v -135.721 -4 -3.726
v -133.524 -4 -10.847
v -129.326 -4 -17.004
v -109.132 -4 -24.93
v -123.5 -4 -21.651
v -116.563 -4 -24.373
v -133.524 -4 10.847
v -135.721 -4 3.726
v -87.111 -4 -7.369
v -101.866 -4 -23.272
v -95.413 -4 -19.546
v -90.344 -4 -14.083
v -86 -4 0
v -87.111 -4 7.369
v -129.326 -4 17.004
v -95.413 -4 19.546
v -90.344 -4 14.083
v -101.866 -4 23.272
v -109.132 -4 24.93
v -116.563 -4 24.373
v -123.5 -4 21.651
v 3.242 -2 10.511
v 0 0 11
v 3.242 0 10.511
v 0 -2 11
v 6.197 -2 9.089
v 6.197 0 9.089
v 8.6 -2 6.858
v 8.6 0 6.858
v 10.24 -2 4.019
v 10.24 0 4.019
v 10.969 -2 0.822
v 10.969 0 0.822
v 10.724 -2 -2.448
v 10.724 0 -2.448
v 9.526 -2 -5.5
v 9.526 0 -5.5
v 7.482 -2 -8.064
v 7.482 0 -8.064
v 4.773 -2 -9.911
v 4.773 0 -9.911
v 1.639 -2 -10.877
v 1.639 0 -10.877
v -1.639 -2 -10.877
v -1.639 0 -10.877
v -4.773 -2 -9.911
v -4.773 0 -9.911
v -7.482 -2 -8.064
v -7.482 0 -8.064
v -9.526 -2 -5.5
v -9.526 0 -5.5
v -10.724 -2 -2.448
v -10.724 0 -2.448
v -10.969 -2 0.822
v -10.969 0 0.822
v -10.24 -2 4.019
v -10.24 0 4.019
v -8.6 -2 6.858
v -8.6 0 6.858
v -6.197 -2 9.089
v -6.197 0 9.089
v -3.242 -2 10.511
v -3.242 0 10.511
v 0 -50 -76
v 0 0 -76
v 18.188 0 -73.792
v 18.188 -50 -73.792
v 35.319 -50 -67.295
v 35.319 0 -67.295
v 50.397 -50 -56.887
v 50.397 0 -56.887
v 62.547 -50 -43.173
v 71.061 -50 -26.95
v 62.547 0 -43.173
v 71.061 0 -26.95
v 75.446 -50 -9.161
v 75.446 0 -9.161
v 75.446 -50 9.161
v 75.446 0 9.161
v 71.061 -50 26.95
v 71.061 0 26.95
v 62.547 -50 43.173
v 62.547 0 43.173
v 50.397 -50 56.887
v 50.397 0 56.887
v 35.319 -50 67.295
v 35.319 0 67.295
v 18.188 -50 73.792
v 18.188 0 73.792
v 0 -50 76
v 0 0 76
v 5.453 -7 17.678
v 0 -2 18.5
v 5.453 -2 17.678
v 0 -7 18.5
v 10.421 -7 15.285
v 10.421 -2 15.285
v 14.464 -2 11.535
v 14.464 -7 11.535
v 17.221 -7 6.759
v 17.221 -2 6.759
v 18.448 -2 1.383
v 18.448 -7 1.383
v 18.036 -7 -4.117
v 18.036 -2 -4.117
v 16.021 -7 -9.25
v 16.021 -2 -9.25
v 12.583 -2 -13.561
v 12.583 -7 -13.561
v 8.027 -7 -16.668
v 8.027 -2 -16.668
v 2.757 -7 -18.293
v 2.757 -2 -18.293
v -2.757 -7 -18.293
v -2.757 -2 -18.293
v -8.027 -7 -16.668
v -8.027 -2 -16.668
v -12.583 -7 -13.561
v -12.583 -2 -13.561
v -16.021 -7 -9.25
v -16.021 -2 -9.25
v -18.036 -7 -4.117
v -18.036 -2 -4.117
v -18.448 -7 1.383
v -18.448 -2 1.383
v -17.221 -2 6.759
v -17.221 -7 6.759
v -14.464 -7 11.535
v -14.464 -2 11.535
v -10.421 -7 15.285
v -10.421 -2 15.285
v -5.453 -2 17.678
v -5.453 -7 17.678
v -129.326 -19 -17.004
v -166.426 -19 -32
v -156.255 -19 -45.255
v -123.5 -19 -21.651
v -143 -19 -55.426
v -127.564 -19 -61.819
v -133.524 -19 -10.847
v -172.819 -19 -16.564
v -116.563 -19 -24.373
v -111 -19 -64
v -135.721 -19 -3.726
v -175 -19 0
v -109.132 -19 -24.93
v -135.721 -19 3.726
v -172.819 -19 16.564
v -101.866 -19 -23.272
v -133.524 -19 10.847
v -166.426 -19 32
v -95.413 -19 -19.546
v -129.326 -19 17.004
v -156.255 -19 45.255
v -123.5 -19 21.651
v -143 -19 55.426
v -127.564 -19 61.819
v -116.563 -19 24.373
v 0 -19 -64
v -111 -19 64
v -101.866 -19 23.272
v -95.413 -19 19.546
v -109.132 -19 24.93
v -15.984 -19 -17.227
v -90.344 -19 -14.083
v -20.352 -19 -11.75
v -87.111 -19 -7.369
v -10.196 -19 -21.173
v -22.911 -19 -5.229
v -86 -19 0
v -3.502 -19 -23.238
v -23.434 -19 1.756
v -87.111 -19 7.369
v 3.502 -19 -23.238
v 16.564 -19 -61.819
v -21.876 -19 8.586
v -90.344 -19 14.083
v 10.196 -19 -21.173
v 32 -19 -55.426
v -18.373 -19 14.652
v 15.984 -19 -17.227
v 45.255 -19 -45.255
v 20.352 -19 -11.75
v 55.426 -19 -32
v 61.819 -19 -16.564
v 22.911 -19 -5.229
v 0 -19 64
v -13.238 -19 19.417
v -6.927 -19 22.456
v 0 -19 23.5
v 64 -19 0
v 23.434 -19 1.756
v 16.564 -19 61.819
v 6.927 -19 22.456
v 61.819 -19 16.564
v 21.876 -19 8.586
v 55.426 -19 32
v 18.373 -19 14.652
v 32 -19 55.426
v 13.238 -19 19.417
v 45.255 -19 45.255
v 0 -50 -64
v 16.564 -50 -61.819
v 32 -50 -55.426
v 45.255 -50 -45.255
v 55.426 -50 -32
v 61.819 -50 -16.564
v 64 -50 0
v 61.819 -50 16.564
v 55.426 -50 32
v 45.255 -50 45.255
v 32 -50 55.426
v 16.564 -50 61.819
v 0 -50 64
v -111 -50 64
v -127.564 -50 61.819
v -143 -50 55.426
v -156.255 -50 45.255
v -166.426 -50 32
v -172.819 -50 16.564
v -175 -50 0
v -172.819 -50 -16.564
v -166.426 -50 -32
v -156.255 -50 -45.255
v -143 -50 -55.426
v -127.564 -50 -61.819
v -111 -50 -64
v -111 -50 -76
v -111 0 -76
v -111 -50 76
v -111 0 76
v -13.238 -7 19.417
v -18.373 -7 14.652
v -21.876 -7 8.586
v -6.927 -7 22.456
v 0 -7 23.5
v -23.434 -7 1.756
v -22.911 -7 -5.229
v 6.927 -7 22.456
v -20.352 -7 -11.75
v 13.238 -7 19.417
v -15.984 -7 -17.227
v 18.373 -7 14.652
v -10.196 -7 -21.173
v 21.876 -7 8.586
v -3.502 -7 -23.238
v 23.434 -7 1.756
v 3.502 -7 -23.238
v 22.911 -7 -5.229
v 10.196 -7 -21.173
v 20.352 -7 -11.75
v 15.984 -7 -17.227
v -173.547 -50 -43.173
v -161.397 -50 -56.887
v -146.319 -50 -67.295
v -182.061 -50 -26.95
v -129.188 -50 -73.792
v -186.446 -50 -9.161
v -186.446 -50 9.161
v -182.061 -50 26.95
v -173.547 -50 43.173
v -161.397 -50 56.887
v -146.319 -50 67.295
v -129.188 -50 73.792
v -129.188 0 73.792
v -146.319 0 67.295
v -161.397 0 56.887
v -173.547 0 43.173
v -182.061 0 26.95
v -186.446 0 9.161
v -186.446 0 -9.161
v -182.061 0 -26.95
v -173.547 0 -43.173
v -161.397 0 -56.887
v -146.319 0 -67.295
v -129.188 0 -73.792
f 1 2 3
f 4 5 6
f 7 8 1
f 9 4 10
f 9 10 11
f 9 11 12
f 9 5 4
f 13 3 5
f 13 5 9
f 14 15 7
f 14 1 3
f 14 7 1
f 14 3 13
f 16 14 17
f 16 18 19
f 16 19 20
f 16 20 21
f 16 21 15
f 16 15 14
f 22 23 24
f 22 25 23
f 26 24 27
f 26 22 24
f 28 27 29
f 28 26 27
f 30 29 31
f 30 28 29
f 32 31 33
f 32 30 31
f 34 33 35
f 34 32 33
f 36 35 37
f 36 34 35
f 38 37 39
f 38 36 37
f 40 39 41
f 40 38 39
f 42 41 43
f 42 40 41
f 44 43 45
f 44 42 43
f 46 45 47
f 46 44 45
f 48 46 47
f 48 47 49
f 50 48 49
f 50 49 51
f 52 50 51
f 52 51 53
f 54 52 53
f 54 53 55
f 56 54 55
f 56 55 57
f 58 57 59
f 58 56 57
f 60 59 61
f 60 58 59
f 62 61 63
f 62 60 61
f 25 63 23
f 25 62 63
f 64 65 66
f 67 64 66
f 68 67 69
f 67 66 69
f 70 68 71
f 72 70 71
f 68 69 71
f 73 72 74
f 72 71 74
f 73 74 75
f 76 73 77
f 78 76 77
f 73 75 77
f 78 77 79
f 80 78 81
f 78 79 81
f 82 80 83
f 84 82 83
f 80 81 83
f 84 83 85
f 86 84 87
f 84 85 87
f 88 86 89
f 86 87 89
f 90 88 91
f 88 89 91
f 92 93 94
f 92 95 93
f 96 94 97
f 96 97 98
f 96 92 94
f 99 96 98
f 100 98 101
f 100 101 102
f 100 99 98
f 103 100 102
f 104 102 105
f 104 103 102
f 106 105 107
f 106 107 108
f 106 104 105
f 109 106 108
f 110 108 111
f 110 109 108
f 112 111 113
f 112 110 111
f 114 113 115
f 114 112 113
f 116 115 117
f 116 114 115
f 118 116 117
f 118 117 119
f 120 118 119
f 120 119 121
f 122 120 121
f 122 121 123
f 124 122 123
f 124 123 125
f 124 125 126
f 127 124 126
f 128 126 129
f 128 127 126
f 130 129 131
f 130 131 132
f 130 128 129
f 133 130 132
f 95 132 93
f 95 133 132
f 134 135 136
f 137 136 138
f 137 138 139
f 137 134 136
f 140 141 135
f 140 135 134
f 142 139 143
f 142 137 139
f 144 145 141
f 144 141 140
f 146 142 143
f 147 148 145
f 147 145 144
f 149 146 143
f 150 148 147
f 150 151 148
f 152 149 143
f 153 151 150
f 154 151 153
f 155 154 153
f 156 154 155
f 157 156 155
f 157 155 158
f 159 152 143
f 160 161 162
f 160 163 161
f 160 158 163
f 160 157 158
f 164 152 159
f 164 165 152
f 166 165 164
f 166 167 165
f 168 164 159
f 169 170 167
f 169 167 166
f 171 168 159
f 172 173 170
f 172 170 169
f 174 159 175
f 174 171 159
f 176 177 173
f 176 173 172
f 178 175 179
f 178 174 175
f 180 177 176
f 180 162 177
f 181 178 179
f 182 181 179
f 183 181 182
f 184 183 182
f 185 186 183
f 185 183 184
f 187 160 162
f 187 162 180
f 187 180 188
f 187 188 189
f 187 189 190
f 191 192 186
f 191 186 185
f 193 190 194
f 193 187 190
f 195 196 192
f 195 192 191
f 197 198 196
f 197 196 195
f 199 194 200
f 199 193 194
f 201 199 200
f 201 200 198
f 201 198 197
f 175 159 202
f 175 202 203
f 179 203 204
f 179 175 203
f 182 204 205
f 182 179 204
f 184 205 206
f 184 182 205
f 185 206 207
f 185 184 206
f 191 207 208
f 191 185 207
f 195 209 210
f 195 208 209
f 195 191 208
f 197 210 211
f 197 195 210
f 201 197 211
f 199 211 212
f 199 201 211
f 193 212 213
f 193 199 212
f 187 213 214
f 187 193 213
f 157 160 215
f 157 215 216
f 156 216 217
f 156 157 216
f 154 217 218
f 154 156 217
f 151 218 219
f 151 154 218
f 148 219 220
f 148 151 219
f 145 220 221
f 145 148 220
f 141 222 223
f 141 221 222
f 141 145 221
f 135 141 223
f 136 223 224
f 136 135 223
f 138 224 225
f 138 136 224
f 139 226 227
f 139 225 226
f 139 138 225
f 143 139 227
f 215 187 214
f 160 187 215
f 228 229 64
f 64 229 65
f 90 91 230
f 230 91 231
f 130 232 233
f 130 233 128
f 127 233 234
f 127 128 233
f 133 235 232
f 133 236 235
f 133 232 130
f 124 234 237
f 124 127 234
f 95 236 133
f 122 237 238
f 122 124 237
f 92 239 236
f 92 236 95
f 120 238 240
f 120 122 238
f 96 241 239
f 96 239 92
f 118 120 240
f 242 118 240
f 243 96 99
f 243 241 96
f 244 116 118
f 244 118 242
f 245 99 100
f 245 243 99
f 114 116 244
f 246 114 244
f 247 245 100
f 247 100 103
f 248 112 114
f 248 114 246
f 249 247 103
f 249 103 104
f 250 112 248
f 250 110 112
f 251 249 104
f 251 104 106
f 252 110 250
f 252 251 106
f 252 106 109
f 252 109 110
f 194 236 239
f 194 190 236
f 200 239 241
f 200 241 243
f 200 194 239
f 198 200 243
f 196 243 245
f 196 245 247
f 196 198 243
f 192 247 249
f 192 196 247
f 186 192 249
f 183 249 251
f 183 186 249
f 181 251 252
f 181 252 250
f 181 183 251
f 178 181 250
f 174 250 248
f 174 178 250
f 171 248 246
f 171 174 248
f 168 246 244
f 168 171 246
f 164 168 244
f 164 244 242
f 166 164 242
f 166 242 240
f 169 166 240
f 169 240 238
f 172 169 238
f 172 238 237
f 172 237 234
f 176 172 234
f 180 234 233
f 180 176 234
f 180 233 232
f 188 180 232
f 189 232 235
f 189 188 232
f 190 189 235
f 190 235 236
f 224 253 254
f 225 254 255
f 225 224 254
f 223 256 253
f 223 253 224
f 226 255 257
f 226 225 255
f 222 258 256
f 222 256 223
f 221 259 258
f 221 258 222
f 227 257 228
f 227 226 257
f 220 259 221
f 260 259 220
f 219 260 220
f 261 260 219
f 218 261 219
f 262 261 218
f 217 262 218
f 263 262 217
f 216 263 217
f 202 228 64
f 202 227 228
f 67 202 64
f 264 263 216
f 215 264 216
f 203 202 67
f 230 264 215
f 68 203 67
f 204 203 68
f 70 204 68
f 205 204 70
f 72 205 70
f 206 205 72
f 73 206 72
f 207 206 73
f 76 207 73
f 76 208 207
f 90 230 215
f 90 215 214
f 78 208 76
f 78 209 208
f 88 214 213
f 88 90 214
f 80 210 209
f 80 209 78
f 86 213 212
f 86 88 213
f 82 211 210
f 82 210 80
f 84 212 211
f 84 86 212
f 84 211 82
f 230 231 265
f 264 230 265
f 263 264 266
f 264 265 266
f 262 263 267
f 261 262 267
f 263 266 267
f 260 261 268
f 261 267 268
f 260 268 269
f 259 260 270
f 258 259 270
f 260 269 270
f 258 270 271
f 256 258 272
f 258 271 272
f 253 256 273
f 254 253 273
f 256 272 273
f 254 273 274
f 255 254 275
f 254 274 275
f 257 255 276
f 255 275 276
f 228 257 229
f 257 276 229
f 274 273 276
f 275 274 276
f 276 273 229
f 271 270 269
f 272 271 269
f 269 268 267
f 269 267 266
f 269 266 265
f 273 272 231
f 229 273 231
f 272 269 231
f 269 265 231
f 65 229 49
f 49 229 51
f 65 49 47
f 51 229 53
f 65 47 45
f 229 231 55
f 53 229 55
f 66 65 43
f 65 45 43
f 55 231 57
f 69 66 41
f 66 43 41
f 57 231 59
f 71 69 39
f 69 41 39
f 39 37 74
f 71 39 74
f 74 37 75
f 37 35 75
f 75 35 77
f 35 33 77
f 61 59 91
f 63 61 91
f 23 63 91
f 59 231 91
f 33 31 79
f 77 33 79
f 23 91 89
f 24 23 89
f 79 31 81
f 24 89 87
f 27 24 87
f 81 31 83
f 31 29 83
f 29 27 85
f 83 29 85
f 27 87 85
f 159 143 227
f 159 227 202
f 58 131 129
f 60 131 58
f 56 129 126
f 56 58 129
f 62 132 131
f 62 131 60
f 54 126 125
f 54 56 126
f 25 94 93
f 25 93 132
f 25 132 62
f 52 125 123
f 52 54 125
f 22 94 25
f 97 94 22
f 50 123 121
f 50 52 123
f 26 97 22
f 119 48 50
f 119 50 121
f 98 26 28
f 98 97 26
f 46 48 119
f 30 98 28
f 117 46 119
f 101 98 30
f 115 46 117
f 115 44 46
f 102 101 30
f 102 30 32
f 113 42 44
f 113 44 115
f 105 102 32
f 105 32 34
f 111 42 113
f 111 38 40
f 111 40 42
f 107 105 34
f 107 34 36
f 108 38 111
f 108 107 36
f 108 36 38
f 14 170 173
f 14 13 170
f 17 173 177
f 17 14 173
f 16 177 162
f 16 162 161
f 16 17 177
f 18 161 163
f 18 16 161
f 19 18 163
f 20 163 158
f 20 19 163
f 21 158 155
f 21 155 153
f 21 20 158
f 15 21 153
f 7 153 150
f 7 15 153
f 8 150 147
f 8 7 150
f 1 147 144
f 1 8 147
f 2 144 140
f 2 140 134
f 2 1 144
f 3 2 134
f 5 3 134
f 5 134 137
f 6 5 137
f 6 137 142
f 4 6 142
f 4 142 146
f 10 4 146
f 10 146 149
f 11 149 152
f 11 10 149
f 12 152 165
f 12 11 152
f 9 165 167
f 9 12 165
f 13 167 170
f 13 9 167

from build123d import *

# Parameters (mm, degrees)
F3_DEPTH = 50
F2_R     = 25
F4_DEPTH = 15
F5_DEPTH = 35
F6_DEPTH = 35


with BuildPart() as f3:
    # F0 (on Front) → F3 (new body)
    with BuildSketch(Plane.XZ):
        with BuildLine():
            Line((0, 76), (-111, 76))
            ThreePointArc((-111, 76), (-187, 0), (-111, -76))
            Line((-111, -76), (0, -76))
            ThreePointArc((0, -76), (76, 0), (0, 76))
        make_face()
    extrude(amount=F3_DEPTH)

    # F2 (on offset) → F4 (cut)
    with BuildSketch(Plane.XZ.offset(19)):
        with Locations((-111, 0)):
            Circle(F2_R)
    extrude(amount=-F4_DEPTH, mode=Mode.SUBTRACT)

    # F2 (on offset) → F5 (cut)
    with BuildSketch(Plane.XZ.offset(19)):
        with Locations((-111, 0)):
            Circle(F2_R)
    extrude(amount=F5_DEPTH, mode=Mode.SUBTRACT)

    # F2 (on offset) → F6 (cut)
    with BuildSketch(Plane.XZ.offset(19)):
        with BuildLine():
            Line((0, 64), (-111, 64))
            ThreePointArc((-111, 64), (-175, 0), (-111, -64))
            Line((-111, -64), (0, -64))
            ThreePointArc((0, -64), (64, 0), (0, 64))
        make_face()
        with Locations((-111, 0)):
            Circle(F2_R, mode=Mode.SUBTRACT)
    extrude(amount=F6_DEPTH, mode=Mode.SUBTRACT)

    # F7 (on Right) → F8 (revolve, cut)
    with BuildSketch(Plane.YZ):
        Polygon((0, 11), (-2, 11), (-2, 18.5), (-7, 18.5), (-7, 23.5), (-19, 23.5), (-19, 0), (0, 0), align=None)
    revolve(axis=Axis((0, 0, 0), (0, 1, 0)), mode=Mode.SUBTRACT)


solid = f3.part
